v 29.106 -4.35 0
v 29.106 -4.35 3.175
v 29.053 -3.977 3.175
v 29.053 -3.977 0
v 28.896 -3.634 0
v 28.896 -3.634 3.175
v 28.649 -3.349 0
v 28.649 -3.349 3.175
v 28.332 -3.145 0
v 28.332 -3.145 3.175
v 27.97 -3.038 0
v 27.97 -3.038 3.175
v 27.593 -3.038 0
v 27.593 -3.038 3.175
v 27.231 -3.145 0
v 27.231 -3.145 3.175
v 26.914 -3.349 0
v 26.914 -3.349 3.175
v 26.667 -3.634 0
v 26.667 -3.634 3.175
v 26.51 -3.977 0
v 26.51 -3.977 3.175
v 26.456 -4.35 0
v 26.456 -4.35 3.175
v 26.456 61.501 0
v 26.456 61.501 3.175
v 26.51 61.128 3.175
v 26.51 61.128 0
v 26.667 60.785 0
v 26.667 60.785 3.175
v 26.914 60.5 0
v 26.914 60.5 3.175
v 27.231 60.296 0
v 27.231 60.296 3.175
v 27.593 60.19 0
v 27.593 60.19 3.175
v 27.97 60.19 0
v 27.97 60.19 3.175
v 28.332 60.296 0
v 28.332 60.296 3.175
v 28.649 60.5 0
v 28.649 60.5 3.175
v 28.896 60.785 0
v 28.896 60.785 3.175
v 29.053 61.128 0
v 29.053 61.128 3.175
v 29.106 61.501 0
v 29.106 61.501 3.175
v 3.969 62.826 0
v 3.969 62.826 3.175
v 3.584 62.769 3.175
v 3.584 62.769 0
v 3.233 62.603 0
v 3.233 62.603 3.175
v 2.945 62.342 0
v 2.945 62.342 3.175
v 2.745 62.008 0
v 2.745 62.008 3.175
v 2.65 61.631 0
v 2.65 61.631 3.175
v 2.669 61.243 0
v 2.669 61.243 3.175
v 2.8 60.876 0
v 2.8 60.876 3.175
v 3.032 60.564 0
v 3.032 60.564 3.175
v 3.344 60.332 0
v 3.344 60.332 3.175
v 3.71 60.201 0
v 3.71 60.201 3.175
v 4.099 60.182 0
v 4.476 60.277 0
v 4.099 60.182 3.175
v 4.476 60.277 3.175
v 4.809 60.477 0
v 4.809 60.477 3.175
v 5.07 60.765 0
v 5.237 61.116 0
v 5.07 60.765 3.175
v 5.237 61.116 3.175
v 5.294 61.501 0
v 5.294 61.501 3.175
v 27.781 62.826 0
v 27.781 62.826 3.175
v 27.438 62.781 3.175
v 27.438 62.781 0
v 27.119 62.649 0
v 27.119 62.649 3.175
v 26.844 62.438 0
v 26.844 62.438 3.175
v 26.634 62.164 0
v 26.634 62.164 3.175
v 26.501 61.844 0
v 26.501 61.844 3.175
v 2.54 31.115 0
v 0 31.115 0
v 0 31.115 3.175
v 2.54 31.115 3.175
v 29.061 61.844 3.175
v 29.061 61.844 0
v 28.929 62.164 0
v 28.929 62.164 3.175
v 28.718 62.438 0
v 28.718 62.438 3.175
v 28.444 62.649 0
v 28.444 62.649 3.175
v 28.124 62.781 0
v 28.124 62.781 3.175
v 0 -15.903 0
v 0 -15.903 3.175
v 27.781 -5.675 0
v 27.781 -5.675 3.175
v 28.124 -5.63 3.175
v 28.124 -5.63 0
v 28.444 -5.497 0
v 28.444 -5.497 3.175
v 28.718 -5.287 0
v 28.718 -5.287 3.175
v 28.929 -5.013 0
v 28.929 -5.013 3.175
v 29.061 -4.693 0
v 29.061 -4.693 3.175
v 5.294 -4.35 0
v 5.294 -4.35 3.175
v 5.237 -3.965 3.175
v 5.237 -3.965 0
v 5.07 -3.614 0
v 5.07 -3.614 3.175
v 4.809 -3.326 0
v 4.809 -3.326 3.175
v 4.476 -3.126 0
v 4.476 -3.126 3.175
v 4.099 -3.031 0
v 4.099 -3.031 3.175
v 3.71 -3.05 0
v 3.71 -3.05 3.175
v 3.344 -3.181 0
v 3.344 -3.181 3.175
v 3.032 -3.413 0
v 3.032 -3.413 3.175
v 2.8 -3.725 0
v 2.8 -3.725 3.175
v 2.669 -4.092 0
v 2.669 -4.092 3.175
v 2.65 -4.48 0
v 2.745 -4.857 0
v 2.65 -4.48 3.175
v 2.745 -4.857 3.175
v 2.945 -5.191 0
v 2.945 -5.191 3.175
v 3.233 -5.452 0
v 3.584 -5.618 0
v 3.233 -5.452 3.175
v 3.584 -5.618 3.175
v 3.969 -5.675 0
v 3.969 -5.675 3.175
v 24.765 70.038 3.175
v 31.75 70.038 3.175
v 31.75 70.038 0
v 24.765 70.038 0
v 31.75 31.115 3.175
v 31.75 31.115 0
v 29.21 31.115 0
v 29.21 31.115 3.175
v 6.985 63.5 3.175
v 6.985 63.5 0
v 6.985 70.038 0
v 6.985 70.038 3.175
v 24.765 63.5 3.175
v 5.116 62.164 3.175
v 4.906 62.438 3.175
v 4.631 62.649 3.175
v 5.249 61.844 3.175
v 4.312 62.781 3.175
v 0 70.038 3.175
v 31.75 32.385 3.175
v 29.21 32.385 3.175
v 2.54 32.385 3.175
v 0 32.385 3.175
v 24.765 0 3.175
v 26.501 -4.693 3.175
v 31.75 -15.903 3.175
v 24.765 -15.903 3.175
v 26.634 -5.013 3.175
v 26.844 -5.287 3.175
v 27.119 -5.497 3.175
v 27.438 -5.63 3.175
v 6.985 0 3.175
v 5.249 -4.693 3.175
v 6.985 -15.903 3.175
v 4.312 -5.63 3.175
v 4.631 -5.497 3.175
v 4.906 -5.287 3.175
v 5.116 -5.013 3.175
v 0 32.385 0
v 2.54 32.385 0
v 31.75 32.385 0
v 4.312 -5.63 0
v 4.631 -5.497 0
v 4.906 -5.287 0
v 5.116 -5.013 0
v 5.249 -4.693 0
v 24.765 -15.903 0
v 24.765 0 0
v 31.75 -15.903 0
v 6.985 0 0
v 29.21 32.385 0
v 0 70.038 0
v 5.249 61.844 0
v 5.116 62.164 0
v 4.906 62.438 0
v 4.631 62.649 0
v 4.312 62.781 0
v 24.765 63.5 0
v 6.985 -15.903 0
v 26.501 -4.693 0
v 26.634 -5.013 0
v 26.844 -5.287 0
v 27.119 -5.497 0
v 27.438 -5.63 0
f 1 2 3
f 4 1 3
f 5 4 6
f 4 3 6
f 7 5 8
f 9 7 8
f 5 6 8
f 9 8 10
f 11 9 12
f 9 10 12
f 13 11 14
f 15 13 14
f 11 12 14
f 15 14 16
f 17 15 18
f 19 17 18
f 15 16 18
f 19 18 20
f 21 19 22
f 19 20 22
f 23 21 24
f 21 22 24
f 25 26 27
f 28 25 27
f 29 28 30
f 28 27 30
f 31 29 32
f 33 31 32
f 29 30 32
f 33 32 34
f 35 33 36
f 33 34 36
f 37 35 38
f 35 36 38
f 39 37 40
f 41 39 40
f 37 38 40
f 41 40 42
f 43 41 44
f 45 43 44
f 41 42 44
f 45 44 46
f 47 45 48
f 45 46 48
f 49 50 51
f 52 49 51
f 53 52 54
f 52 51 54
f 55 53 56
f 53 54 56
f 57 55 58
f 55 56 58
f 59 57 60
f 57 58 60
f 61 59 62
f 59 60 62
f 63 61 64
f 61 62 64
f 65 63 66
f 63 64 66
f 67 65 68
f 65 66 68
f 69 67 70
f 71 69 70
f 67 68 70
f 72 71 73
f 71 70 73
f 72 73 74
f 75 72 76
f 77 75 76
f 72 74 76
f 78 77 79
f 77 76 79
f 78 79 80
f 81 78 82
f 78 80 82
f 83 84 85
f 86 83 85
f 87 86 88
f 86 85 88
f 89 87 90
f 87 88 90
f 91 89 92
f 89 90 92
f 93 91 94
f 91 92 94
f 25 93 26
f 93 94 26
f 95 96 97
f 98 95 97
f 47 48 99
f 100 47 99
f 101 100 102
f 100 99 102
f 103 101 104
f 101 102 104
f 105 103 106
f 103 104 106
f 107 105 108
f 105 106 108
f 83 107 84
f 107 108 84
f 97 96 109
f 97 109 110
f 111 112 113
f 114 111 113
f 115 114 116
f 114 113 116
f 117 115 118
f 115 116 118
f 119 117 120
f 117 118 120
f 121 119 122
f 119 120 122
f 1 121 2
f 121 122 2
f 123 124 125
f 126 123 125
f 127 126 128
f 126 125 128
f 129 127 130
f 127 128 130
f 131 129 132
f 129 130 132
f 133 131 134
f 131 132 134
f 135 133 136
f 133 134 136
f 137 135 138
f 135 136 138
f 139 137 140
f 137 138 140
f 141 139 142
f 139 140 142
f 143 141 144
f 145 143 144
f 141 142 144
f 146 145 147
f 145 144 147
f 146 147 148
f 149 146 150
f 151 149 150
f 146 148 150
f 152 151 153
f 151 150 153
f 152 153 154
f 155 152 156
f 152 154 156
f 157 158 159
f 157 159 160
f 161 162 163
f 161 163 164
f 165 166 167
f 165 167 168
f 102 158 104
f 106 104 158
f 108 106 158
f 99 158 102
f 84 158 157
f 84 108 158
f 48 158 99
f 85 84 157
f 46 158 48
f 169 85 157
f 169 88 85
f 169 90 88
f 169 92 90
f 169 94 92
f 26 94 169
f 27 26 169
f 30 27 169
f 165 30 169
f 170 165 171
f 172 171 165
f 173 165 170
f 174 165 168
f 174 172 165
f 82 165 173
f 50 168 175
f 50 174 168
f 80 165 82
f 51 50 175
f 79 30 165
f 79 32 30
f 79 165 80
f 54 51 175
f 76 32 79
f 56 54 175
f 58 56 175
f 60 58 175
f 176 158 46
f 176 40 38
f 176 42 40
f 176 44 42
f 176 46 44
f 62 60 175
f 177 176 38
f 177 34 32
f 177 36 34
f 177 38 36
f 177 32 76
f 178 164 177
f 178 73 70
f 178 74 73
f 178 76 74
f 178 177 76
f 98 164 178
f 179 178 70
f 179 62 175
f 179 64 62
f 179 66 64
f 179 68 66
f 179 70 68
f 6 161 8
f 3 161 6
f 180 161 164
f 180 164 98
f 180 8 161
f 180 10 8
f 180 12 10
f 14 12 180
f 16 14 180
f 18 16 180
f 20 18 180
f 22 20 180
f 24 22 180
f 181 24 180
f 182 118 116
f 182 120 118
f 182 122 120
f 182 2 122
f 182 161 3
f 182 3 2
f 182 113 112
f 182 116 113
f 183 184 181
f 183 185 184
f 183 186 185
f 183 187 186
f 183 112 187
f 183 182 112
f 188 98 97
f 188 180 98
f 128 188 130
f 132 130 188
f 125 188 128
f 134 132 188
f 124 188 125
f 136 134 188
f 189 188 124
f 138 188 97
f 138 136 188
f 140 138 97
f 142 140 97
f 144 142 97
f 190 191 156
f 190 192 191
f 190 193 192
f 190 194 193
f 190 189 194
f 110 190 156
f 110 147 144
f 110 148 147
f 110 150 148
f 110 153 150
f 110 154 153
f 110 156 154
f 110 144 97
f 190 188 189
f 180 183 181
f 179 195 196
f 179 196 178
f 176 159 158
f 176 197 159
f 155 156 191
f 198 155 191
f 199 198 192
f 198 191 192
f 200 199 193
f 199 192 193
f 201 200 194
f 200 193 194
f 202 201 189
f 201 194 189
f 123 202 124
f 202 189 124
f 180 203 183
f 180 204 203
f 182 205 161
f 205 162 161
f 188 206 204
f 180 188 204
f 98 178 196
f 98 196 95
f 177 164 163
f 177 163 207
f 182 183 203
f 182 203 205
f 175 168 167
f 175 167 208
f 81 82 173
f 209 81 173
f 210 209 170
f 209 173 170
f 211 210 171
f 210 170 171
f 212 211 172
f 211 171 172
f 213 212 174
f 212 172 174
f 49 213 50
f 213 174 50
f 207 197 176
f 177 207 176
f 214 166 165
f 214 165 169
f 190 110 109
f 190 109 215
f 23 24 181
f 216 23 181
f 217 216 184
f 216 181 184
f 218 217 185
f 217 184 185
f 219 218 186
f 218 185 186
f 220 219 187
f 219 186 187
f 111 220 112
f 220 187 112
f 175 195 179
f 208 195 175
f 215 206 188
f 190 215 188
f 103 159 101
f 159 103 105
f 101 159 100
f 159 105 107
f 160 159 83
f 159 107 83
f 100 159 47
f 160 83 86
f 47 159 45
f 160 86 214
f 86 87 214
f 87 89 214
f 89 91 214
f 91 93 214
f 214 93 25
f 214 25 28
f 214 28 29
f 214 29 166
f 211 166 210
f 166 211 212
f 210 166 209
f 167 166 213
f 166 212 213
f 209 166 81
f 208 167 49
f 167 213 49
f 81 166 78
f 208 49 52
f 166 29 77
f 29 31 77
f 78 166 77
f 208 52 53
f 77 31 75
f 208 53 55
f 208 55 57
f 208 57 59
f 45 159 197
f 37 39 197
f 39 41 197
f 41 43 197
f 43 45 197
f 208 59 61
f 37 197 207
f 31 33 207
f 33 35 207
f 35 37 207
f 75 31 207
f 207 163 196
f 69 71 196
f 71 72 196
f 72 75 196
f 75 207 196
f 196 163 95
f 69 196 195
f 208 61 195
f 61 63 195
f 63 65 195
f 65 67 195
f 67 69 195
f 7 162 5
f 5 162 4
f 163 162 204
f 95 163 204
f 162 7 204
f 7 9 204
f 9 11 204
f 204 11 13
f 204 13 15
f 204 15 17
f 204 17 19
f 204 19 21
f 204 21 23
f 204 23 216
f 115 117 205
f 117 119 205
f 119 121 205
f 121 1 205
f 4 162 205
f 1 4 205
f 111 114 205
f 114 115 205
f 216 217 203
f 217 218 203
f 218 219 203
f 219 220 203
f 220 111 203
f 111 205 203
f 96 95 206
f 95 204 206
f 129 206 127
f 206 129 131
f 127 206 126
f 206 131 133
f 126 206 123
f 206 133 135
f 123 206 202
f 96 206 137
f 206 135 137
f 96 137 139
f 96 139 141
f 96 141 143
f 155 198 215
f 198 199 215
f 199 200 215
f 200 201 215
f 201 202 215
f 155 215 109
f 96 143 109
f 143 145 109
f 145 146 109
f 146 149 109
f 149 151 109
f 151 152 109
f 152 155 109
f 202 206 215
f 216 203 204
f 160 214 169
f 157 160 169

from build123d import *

# Parameters (mm, degrees)
F0_W      = 31.75
F0_H      = 63.5
F1_DEPTH  = 3.175
F2_W      = 1.27
F2_H      = 3.175
F3_DEPTH  = 2.54
F4_W      = 1.27
F4_H      = 3.175
F5_DEPTH  = 2.54
F6_W      = 6.985
F6_H      = 3.175
F7_DEPTH  = 6.35
F9_DEPTH  = 25.4
F10_DEPTH = 25.4
F12_DEPTH = 9.55294
F11_W     = 6.985
F11_H     = 3.175
F13_DEPTH = 6.53796


with BuildPart() as f1:
    # F0 (on Top) → F1 (new body)
    with BuildSketch(Plane.XY):
        with Locations((15.875, 31.75)):
            Rectangle(F0_W, F0_H)
    extrude(amount=F1_DEPTH)

    # F2 (on face) → F3 (cut)
    with BuildSketch(Plane.YZ.offset(31.75)):
        with Locations((31.75, 1.5875)):
            Rectangle(F2_W, F2_H)
    extrude(amount=-F3_DEPTH, mode=Mode.SUBTRACT)

    # F4 (on face) → F5 (cut)
    with BuildSketch(Plane(origin=(0, 0, 0), x_dir=(0, -1, 0), z_dir=(-1, 0, 0))):
        with Locations((-31.75, 1.5875)):
            Rectangle(F4_W, F4_H)
    extrude(amount=-F5_DEPTH, mode=Mode.SUBTRACT)

    # F6 (on face) → F7 (join)
    with BuildSketch(Plane.XZ):
        with Locations((3.4925, 1.5875)):
            Rectangle(F6_W, F6_H)
        with Locations((28.2575, 1.5875)):
            Rectangle(F6_W, F6_H)
    extrude(amount=F7_DEPTH)

    # F8 (on face) → F9 (cut)
    with BuildSketch(Plane.XY.offset(3.175)):
        with BuildLine():
            ThreePointArc((5.29375, -4.35), (3.0318335149, -3.4130835149), (3.96875, -5.675))
            Line((3.96875, -5.675), (3.96875, -4.35))
            Line((3.96875, -4.35), (5.29375, -4.35))
        make_face()
        with BuildLine():
            Line((3.96875, -4.35), (3.96875, -5.675))
            ThreePointArc((3.96875, -5.675), (4.9056664851, -5.2869164851), (5.29375, -4.35))
            Line((5.29375, -4.35), (3.96875, -4.35))
        make_face()
        with BuildLine():
            ThreePointArc((29.10625, -4.35), (27.78125, -3.025), (26.45625, -4.35))
            Line((26.45625, -4.35), (27.78125, -4.35))
            Line((27.78125, -4.35), (27.78125, -5.675))
            ThreePointArc((27.78125, -5.675), (28.7181664851, -5.2869164851), (29.10625, -4.35))
        make_face()
        with BuildLine():
            Line((27.78125, -4.35), (26.45625, -4.35))
            ThreePointArc((26.45625, -4.35), (26.8443335149, -5.2869164851), (27.78125, -5.675))
            Line((27.78125, -5.675), (27.78125, -4.35))
        make_face()
    extrude(amount=-F9_DEPTH, mode=Mode.SUBTRACT)

    # F8 (on face) → F10 (cut)
    with BuildSketch(Plane.XY.offset(3.175)):
        with BuildLine():
            ThreePointArc((3.96875, 62.82602), (3.0318335149, 60.5641035149), (5.29375, 61.50102))
            ThreePointArc((5.29375, 61.50102), (4.9056664851, 62.4379364851), (3.96875, 62.82602))
        make_face()
        with BuildLine():
            ThreePointArc((27.78125, 62.82602), (26.8443335149, 62.4379364851), (26.45625, 61.50102))
            ThreePointArc((26.45625, 61.50102), (27.78125, 60.17602), (29.10625, 61.50102))
            ThreePointArc((29.10625, 61.50102), (28.7181664851, 62.4379364851), (27.78125, 62.82602))
        make_face()
    extrude(amount=-F10_DEPTH, mode=Mode.SUBTRACT)

    # F12 (add): faces of the model
    f12_faces = [f1.faces().sort_by_distance(p)[0] for p in [
        (28.2575, -6.35, 1.5875),
        (3.4925, -6.35, 1.5875),
    ]]
    extrude(f12_faces, amount=F12_DEPTH)

    # F11 (on face) → F13 (join)
    with BuildSketch(Plane(origin=(0, 63.5, 0), x_dir=(-1, 0, 0), z_dir=(0, 1, 0))):
        with Locations((-28.2575, 1.5875)):
            Rectangle(F11_W, F11_H)
        with Locations((-3.4925, 1.5875)):
            Rectangle(F11_W, F11_H)
    extrude(amount=F13_DEPTH)


solid = f1.part
